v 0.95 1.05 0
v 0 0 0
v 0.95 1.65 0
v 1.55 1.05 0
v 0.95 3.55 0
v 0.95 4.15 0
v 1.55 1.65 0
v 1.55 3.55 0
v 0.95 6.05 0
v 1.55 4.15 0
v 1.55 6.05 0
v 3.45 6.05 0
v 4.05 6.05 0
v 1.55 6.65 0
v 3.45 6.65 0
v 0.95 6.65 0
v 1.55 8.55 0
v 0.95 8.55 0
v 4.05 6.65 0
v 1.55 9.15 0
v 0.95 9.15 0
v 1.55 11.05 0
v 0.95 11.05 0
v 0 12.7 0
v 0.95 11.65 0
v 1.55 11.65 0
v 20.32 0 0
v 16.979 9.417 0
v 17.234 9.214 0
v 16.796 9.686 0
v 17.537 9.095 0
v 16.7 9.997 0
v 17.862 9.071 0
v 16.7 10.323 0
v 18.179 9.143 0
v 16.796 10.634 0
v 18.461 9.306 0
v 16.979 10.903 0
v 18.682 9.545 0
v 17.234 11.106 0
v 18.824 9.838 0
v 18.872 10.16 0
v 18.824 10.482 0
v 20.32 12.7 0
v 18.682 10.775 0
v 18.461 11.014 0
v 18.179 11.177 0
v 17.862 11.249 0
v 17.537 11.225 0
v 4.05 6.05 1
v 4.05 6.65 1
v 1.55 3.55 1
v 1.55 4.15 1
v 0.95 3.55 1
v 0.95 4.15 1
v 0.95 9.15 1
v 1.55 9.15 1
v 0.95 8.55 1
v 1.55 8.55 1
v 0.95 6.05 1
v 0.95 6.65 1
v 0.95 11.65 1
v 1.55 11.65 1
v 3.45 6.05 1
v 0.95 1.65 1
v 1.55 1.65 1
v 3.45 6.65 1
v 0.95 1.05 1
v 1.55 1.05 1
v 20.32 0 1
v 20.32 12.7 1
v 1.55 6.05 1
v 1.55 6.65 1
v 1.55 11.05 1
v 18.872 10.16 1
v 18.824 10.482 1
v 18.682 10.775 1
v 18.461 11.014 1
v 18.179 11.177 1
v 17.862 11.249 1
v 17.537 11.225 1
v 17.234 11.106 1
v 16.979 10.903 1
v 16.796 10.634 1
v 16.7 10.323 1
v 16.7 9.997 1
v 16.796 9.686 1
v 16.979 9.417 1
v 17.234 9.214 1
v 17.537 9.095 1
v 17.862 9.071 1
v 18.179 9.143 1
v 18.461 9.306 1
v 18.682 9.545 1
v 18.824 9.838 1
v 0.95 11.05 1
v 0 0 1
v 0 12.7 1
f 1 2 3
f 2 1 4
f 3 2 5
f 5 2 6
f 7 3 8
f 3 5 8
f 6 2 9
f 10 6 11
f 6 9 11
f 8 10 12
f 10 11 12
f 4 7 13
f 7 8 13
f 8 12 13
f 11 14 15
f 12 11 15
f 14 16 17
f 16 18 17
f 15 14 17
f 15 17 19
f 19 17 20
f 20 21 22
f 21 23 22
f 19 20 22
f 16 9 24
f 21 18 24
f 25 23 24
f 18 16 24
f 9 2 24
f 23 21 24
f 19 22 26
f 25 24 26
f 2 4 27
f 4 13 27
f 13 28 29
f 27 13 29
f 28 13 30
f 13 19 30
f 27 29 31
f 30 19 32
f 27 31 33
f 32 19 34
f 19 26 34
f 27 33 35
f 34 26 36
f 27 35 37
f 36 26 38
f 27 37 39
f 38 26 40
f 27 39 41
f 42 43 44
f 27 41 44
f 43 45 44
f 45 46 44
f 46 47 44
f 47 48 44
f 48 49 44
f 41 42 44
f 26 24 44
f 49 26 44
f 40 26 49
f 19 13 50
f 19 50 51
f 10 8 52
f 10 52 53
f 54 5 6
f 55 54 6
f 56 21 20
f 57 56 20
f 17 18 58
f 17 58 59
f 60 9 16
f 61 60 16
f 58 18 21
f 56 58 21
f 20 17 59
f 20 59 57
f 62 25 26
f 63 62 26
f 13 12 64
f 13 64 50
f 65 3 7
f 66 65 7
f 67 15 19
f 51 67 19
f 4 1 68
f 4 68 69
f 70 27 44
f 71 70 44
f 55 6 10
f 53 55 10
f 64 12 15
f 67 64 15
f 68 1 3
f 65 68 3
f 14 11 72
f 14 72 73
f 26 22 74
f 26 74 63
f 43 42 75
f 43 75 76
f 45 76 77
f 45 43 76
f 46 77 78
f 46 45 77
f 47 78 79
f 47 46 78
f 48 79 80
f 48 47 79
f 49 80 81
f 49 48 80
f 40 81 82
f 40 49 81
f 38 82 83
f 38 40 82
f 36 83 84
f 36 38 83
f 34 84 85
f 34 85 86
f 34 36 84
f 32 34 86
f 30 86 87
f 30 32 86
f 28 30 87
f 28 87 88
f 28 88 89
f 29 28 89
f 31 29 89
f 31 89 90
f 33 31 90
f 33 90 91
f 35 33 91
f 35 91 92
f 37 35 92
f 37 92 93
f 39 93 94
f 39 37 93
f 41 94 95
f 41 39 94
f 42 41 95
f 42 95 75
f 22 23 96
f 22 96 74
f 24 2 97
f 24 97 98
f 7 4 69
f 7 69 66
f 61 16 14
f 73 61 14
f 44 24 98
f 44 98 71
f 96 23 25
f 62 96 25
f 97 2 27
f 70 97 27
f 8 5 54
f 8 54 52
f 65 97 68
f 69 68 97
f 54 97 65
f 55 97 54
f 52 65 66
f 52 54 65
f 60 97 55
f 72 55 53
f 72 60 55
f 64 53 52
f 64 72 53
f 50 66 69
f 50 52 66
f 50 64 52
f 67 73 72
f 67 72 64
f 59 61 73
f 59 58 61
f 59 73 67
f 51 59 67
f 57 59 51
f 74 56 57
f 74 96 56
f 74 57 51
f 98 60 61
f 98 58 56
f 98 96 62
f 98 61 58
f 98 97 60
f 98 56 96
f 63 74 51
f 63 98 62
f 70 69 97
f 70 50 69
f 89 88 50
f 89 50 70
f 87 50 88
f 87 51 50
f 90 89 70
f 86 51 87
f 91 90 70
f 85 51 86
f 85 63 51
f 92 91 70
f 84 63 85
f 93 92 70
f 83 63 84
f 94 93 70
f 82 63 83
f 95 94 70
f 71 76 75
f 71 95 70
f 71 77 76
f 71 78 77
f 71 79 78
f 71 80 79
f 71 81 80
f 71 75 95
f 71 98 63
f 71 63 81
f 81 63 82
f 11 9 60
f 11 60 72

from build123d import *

# Parameters (mm, degrees)
F0_W     = 20.32
F0_H     = 12.7
F0_W_2   = 0.6
F0_H_2   = 0.6
F0_R     = 1.0922
F1_DEPTH = 1


with BuildPart() as f1:
    # F0 (on Top) → F1 (new body)
    with BuildSketch(Plane.XY):
        with Locations((10.16, 6.35)):
            Rectangle(F0_W, F0_H)
        with Locations((1.25, 1.35)):
            Rectangle(F0_W_2, F0_H_2, mode=Mode.SUBTRACT)
        with Locations((1.25, 3.85)):
            Rectangle(F0_W_2, F0_H_2, mode=Mode.SUBTRACT)
        with Locations((1.25, 6.35)):
            Rectangle(F0_W_2, F0_H_2, mode=Mode.SUBTRACT)
        with Locations((3.75, 6.35)):
            Rectangle(F0_W_2, F0_H_2, mode=Mode.SUBTRACT)
        with Locations((1.25, 8.85)):
            Rectangle(F0_W_2, F0_H_2, mode=Mode.SUBTRACT)
        with Locations((1.25, 11.35)):
            Rectangle(F0_W_2, F0_H_2, mode=Mode.SUBTRACT)
        with Locations((17.78, 10.16)):
            Circle(F0_R, mode=Mode.SUBTRACT)
    extrude(amount=F1_DEPTH)


solid = f1.part
